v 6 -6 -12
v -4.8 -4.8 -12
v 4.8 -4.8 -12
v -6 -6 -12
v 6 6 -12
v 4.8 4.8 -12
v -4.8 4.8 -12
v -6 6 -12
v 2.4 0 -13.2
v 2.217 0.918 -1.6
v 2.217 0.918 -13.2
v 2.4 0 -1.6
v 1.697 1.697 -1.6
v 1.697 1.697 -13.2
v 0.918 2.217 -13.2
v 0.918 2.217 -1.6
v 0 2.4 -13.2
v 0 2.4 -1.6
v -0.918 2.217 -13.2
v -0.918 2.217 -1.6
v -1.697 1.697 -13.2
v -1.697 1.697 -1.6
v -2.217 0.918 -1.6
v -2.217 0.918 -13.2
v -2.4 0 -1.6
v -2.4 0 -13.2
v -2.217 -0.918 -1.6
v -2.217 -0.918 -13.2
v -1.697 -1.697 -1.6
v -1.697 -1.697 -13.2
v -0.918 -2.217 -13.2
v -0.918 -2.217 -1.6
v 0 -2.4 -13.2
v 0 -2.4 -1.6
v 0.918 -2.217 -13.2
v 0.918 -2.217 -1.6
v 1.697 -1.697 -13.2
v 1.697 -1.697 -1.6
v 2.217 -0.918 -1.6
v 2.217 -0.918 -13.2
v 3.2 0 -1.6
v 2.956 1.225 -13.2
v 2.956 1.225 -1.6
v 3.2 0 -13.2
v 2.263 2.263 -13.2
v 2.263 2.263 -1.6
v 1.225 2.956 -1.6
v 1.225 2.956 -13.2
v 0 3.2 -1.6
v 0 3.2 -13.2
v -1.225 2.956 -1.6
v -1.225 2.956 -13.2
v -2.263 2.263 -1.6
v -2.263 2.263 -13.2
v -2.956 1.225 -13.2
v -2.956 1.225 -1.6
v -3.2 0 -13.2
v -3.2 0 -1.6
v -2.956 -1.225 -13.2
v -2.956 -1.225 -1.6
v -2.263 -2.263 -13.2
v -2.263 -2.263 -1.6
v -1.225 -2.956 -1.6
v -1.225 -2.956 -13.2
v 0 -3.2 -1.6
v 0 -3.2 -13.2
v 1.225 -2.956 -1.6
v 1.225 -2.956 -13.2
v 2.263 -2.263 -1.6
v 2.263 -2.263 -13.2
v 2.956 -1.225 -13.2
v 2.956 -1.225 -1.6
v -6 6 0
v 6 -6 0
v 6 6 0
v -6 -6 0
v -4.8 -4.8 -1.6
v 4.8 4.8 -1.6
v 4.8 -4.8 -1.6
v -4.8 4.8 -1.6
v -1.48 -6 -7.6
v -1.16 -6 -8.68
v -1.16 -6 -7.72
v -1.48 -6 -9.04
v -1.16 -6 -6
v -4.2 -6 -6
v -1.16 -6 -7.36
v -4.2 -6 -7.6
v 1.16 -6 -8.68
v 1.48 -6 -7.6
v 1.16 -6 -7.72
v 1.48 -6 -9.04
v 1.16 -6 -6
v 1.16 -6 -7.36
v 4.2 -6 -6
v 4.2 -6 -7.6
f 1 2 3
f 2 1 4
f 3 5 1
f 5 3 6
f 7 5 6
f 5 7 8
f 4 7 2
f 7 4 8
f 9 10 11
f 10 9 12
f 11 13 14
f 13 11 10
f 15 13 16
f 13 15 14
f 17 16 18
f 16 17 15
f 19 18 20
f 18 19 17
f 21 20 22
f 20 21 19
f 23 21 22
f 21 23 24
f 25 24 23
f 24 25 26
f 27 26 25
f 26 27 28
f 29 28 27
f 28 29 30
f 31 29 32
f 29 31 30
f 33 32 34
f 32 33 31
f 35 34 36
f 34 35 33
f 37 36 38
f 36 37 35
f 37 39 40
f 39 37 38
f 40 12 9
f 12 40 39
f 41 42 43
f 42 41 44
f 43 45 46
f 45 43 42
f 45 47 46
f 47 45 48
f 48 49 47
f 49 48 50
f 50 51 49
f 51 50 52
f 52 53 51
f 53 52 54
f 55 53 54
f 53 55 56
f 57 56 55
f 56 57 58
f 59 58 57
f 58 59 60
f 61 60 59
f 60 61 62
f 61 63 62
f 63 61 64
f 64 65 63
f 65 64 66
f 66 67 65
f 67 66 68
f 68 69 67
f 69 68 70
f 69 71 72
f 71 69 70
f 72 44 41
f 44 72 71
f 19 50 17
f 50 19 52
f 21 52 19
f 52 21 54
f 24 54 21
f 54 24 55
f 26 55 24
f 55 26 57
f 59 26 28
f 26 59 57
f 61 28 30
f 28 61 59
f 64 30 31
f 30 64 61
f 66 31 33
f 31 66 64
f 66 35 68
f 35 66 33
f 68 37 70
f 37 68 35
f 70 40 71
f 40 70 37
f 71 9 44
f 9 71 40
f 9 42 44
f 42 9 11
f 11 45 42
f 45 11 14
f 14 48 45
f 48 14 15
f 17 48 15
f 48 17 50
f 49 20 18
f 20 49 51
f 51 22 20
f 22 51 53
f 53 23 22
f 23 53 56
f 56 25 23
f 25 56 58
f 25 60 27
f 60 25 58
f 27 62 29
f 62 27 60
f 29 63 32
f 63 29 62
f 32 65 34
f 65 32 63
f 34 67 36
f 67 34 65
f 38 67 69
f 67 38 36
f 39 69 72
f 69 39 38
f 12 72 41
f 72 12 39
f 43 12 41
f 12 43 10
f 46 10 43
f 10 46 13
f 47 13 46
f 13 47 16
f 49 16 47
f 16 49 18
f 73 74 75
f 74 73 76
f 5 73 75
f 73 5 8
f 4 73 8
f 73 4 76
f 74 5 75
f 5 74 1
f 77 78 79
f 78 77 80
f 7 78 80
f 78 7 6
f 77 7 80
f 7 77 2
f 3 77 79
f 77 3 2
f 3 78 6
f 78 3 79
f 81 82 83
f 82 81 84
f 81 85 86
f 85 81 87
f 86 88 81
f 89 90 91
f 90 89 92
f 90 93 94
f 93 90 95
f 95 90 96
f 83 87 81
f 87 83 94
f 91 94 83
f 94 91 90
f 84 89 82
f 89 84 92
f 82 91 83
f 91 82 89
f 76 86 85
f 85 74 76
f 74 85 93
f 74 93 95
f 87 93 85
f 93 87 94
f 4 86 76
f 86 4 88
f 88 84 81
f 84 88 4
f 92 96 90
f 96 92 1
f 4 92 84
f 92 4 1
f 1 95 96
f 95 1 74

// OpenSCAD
// file: ../p/4-4ring3.scad
use <../lib.scad>
$fa=1; $fs=0.2;
function ldraw_lib__4_4ring3(realsolid=false) = [
// 0 Ring  3 x 1.0
// 0 Name: 4-4ring3.dat
// 0 Author: James Jessiman
// 0 !LDRAW_ORG Primitive UPDATE 2009-01
// 0 !LICENSE Licensed under CC BY 2.0 and CC BY 4.0 : see CAreadme.txt
// 
// 0 BFC CERTIFY CCW
  [0,"BFC","CERTIFY"],
  [0,"BFC","CCW"],
// 
// 0 !HISTORY 1998-12-15 [PTadmin] Official Update 1998-10
// 0 !HISTORY 2002-04-05 [hafhead] Added BFC statement
// 0 !HISTORY 2002-04-25 [PTadmin] Official Update 2002-02
// 0 !HISTORY 2007-06-24 [PTadmin] Header formatted for Contributor Agreement
// 0 !HISTORY 2008-07-01 [PTadmin] Official Update 2008-01
// 0 !HISTORY 2008-08-26 [cwdee] Switch polygon winding and rename
// 0 !HISTORY 2009-05-02 [PTadmin] Official Update 2009-01
// 
// 
// 4 16 -1.5308 0 3.6956 -1.1481 0 2.7717 0 0 3 0 0 4
  [4,16,-1.5308,0,3.6956,-1.1481,0,2.7717,0,0,3,0,0,4],
// 4 16 -2.8284 0 2.8284 -2.1213 0 2.1213 -1.1481 0 2.7717 -1.5308 0 3.6956
  [4,16,-2.8284,0,2.8284,-2.1213,0,2.1213,-1.1481,0,2.7717,-1.5308,0,3.6956],
// 4 16 -3.6956 0 1.5308 -2.7717 0 1.1481 -2.1213 0 2.1213 -2.8284 0 2.8284
  [4,16,-3.6956,0,1.5308,-2.7717,0,1.1481,-2.1213,0,2.1213,-2.8284,0,2.8284],
// 4 16 -4 0 0 -3 0 0 -2.7717 0 1.1481 -3.6956 0 1.5308
  [4,16,-4,0,0,-3,0,0,-2.7717,0,1.1481,-3.6956,0,1.5308],
// 4 16 -3.6956 0 -1.5308 -2.7717 0 -1.1481 -3 0 0 -4 0 0
  [4,16,-3.6956,0,-1.5308,-2.7717,0,-1.1481,-3,0,0,-4,0,0],
// 4 16 -2.8284 0 -2.8284 -2.1213 0 -2.1213 -2.7717 0 -1.1481 -3.6956 0 -1.5308
  [4,16,-2.8284,0,-2.8284,-2.1213,0,-2.1213,-2.7717,0,-1.1481,-3.6956,0,-1.5308],
// 4 16 -1.5308 0 -3.6956 -1.1481 0 -2.7717 -2.1213 0 -2.1213 -2.8284 0 -2.8284
  [4,16,-1.5308,0,-3.6956,-1.1481,0,-2.7717,-2.1213,0,-2.1213,-2.8284,0,-2.8284],
// 4 16 0 0 -4 0 0 -3 -1.1481 0 -2.7717 -1.5308 0 -3.6956
  [4,16,0,0,-4,0,0,-3,-1.1481,0,-2.7717,-1.5308,0,-3.6956],
// 4 16 1.5308 0 -3.6956 1.1481 0 -2.7717 0 0 -3 0 0 -4
  [4,16,1.5308,0,-3.6956,1.1481,0,-2.7717,0,0,-3,0,0,-4],
// 4 16 2.8284 0 -2.8284 2.1213 0 -2.1213 1.1481 0 -2.7717 1.5308 0 -3.6956
  [4,16,2.8284,0,-2.8284,2.1213,0,-2.1213,1.1481,0,-2.7717,1.5308,0,-3.6956],
// 4 16 3.6956 0 -1.5308 2.7717 0 -1.1481 2.1213 0 -2.1213 2.8284 0 -2.8284
  [4,16,3.6956,0,-1.5308,2.7717,0,-1.1481,2.1213,0,-2.1213,2.8284,0,-2.8284],
// 4 16 4 0 0 3 0 0 2.7717 0 -1.1481 3.6956 0 -1.5308
  [4,16,4,0,0,3,0,0,2.7717,0,-1.1481,3.6956,0,-1.5308],
// 4 16 3.6956 0 1.5308 2.7717 0 1.1481 3 0 0 4 0 0
  [4,16,3.6956,0,1.5308,2.7717,0,1.1481,3,0,0,4,0,0],
// 4 16 2.8284 0 2.8284 2.1213 0 2.1213 2.7717 0 1.1481 3.6956 0 1.5308
  [4,16,2.8284,0,2.8284,2.1213,0,2.1213,2.7717,0,1.1481,3.6956,0,1.5308],
// 4 16 1.5308 0 3.6956 1.1481 0 2.7717 2.1213 0 2.1213 2.8284 0 2.8284
  [4,16,1.5308,0,3.6956,1.1481,0,2.7717,2.1213,0,2.1213,2.8284,0,2.8284],
// 4 16 0 0 4 0 0 3 1.1481 0 2.7717 1.5308 0 3.6956
  [4,16,0,0,4,0,0,3,1.1481,0,2.7717,1.5308,0,3.6956],
// 0
];
module ldraw_lib__4_4ring3(step=0, col=false, unit=2/5, alt=false, line=0.2, solid=!$preview)
    makepoly(ldraw_lib__4_4ring3(solid), step=step, col=col, unit=unit, alt=alt, line=line, solid=solid);
ldraw_lib__4_4ring3(line=0.2);
// file: ../p/4-4edge.scad
use <../lib.scad>
function ldraw_lib__4_4edge() = [
// 0 Circle 1.0
// 0 Name: 4-4edge.dat
// 0 Author: James Jessiman
// 0 !LDRAW_ORG Primitive UPDATE 2017-01
// 0 !LICENSE Licensed under CC BY 2.0 and CC BY 4.0 : see CAreadme.txt
// 
// 0 BFC CERTIFY CCW
  [0,"BFC","CERTIFY"],
  [0,"BFC","CCW"],
// 
// 0 !HISTORY 1998-12-15 [PTadmin] Official Update 1998-10
// 0 !HISTORY 2005-12-28 [PTadmin] Official Update 2005-01
// 0 !HISTORY 2007-06-24 [PTadmin] Header formatted for Contributor Agreement
// 0 !HISTORY 2008-07-01 [PTadmin] Official Update 2008-01
// 0 !HISTORY 2017-01-15 [Steffen] BFCed
// 0 !HISTORY 2017-12-30 [PTadmin] Official Update 2017-01
// 
// 
// 2 24 1 0 0 0.9239 0 0.3827
  [2,24,1,0,0,0.9239,0,0.3827],
// 2 24 0.9239 0 0.3827 0.7071 0 0.7071
  [2,24,0.9239,0,0.3827,0.7071,0,0.7071],
// 2 24 0.7071 0 0.7071 0.3827 0 0.9239
  [2,24,0.7071,0,0.7071,0.3827,0,0.9239],
// 2 24 0.3827 0 0.9239 0 0 1
  [2,24,0.3827,0,0.9239,0,0,1],
// 2 24 0 0 1 -0.3827 0 0.9239
  [2,24,0,0,1,-0.3827,0,0.9239],
// 2 24 -0.3827 0 0.9239 -0.7071 0 0.7071
  [2,24,-0.3827,0,0.9239,-0.7071,0,0.7071],
// 2 24 -0.7071 0 0.7071 -0.9239 0 0.3827
  [2,24,-0.7071,0,0.7071,-0.9239,0,0.3827],
// 2 24 -0.9239 0 0.3827 -1 0 -0
  [2,24,-0.9239,0,0.3827,-1,0,-0],
// 2 24 -1 0 -0 -0.9239 0 -0.3827
  [2,24,-1,0,-0,-0.9239,0,-0.3827],
// 2 24 -0.9239 0 -0.3827 -0.7071 0 -0.7071
  [2,24,-0.9239,0,-0.3827,-0.7071,0,-0.7071],
// 2 24 -0.7071 0 -0.7071 -0.3827 0 -0.9239
  [2,24,-0.7071,0,-0.7071,-0.3827,0,-0.9239],
// 2 24 -0.3827 0 -0.9239 0 0 -1
  [2,24,-0.3827,0,-0.9239,0,0,-1],
// 2 24 0 0 -1 0.3827 0 -0.9239
  [2,24,0,0,-1,0.3827,0,-0.9239],
// 2 24 0.3827 0 -0.9239 0.7071 0 -0.7071
  [2,24,0.3827,0,-0.9239,0.7071,0,-0.7071],
// 2 24 0.7071 0 -0.7071 0.9239 0 -0.3827
  [2,24,0.7071,0,-0.7071,0.9239,0,-0.3827],
// 2 24 0.9239 0 -0.3827 1 0 0
  [2,24,0.9239,0,-0.3827,1,0,0],
];
module ldraw_lib__4_4edge(step=0, col=false, unit=2/5, alt=false, line=0.2, solid=!$preview)
    makepoly(ldraw_lib__4_4edge(), step=step, col=col, unit=unit, alt=alt, line=line, solid=solid);
ldraw_lib__4_4edge(line=0.2);
// file: ../p/4-4cyli.scad
use <../lib.scad>
$fa=1; $fs=0.2;
function ldraw_lib__4_4cyli(realsolid=false) = [
// 0 Cylinder 1.0
// 0 Name: 4-4cyli.dat
// 0 Author: James Jessiman
// 0 !LDRAW_ORG Primitive UPDATE 2005-01
// 0 !LICENSE Licensed under CC BY 2.0 and CC BY 4.0 : see CAreadme.txt
// 
// 0 BFC CERTIFY CCW
  [0,"BFC","CERTIFY"],
  [0,"BFC","CCW"],
// 
// 0 !HISTORY 1998-12-15 [PTadmin] Official Update 1998-10
// 0 !HISTORY 2002-03-23 [sbliss] Added BFC statement; merged headers from files in distributions LDraw 0.27 and Complete.
// 0 !HISTORY 2002-04-25 [PTadmin] Official Update 2002-02
// 0 !HISTORY 2004-12-14 [guyvivan] BFC CCW
// 0 !HISTORY 2005-12-28 [PTadmin] Official Update 2005-01
// 0 !HISTORY 2007-06-24 [PTadmin] Header formatted for Contributor Agreement
// 0 !HISTORY 2008-07-01 [PTadmin] Official Update 2008-01
// 
// 
// 4 16 1 1 0 0.9239 1 0.3827 0.9239 0 0.3827 1 0 0
  [4,16,1,1,0,0.9239,1,0.3827,0.9239,0,0.3827,1,0,0],
// 5 24 1 0 0 1 1 0 0.9239 0 0.3827 0.9239 0 -0.3827
  [5,24,1,0,0,1,1,0,0.9239,0,0.3827,0.9239,0,-0.3827],
// 4 16 0.9239 1 0.3827 0.7071 1 0.7071 0.7071 0 0.7071 0.9239 0 0.3827
  [4,16,0.9239,1,0.3827,0.7071,1,0.7071,0.7071,0,0.7071,0.9239,0,0.3827],
// 5 24 0.9239 0 0.3827 0.9239 1 0.3827 0.7071 0 0.7071 1 0 0
  [5,24,0.9239,0,0.3827,0.9239,1,0.3827,0.7071,0,0.7071,1,0,0],
// 4 16 0.7071 1 0.7071 0.3827 1 0.9239 0.3827 0 0.9239 0.7071 0 0.7071
  [4,16,0.7071,1,0.7071,0.3827,1,0.9239,0.3827,0,0.9239,0.7071,0,0.7071],
// 5 24 0.7071 0 0.7071 0.7071 1 0.7071 0.3827 0 0.9239 0.9239 0 0.3827
  [5,24,0.7071,0,0.7071,0.7071,1,0.7071,0.3827,0,0.9239,0.9239,0,0.3827],
// 4 16 0.3827 1 0.9239 0 1 1 0 0 1 0.3827 0 0.9239
  [4,16,0.3827,1,0.9239,0,1,1,0,0,1,0.3827,0,0.9239],
// 5 24 0.3827 0 0.9239 0.3827 1 0.9239 0 0 1 0.7071 0 0.7071
  [5,24,0.3827,0,0.9239,0.3827,1,0.9239,0,0,1,0.7071,0,0.7071],
// 4 16 0 1 1 -0.3827 1 0.9239 -0.3827 0 0.9239 0 0 1
  [4,16,0,1,1,-0.3827,1,0.9239,-0.3827,0,0.9239,0,0,1],
// 5 24 0 0 1 0 1 1 -0.3827 0 0.9239 0.3827 0 0.9239
  [5,24,0,0,1,0,1,1,-0.3827,0,0.9239,0.3827,0,0.9239],
// 4 16 -0.3827 1 0.9239 -0.7071 1 0.7071 -0.7071 0 0.7071 -0.3827 0 0.9239
  [4,16,-0.3827,1,0.9239,-0.7071,1,0.7071,-0.7071,0,0.7071,-0.3827,0,0.9239],
// 5 24 -0.3827 0 0.9239 -0.3827 1 0.9239 -0.7071 0 0.7071 0 0 1
  [5,24,-0.3827,0,0.9239,-0.3827,1,0.9239,-0.7071,0,0.7071,0,0,1],
// 4 16 -0.7071 1 0.7071 -0.9239 1 0.3827 -0.9239 0 0.3827 -0.7071 0 0.7071
  [4,16,-0.7071,1,0.7071,-0.9239,1,0.3827,-0.9239,0,0.3827,-0.7071,0,0.7071],
// 5 24 -0.7071 0 0.7071 -0.7071 1 0.7071 -0.9239 0 0.3827 -0.3827 0 0.9239
  [5,24,-0.7071,0,0.7071,-0.7071,1,0.7071,-0.9239,0,0.3827,-0.3827,0,0.9239],
// 4 16 -0.9239 1 0.3827 -1 1 0 -1 0 0 -0.9239 0 0.3827
  [4,16,-0.9239,1,0.3827,-1,1,0,-1,0,0,-0.9239,0,0.3827],
// 5 24 -0.9239 0 0.3827 -0.9239 1 0.3827 -1 0 0 -0.7071 0 0.7071
  [5,24,-0.9239,0,0.3827,-0.9239,1,0.3827,-1,0,0,-0.7071,0,0.7071],
// 4 16 -1 1 0 -0.9239 1 -0.3827 -0.9239 0 -0.3827 -1 0 0
  [4,16,-1,1,0,-0.9239,1,-0.3827,-0.9239,0,-0.3827,-1,0,0],
// 5 24 -1 0 0 -1 1 0 -0.9239 0 -0.3827 -0.9239 0 0.3827
  [5,24,-1,0,0,-1,1,0,-0.9239,0,-0.3827,-0.9239,0,0.3827],
// 4 16 -0.9239 1 -0.3827 -0.7071 1 -0.7071 -0.7071 0 -0.7071 -0.9239 0 -0.3827
  [4,16,-0.9239,1,-0.3827,-0.7071,1,-0.7071,-0.7071,0,-0.7071,-0.9239,0,-0.3827],
// 5 24 -0.9239 0 -0.3827 -0.9239 1 -0.3827 -0.7071 0 -0.7071 -1 0 0
  [5,24,-0.9239,0,-0.3827,-0.9239,1,-0.3827,-0.7071,0,-0.7071,-1,0,0],
// 4 16 -0.7071 1 -0.7071 -0.3827 1 -0.9239 -0.3827 0 -0.9239 -0.7071 0 -0.7071
  [4,16,-0.7071,1,-0.7071,-0.3827,1,-0.9239,-0.3827,0,-0.9239,-0.7071,0,-0.7071],
// 5 24 -0.7071 0 -0.7071 -0.7071 1 -0.7071 -0.3827 0 -0.9239 -0.9239 0 -0.3827
  [5,24,-0.7071,0,-0.7071,-0.7071,1,-0.7071,-0.3827,0,-0.9239,-0.9239,0,-0.3827],
// 4 16 -0.3827 1 -0.9239 0 1 -1 0 0 -1 -0.3827 0 -0.9239
  [4,16,-0.3827,1,-0.9239,0,1,-1,0,0,-1,-0.3827,0,-0.9239],
// 5 24 -0.3827 0 -0.9239 -0.3827 1 -0.9239 0 0 -1 -0.7071 0 -0.7071
  [5,24,-0.3827,0,-0.9239,-0.3827,1,-0.9239,0,0,-1,-0.7071,0,-0.7071],
// 4 16 0 1 -1 0.3827 1 -0.9239 0.3827 0 -0.9239 0 0 -1
  [4,16,0,1,-1,0.3827,1,-0.9239,0.3827,0,-0.9239,0,0,-1],
// 5 24 0 0 -1 0 1 -1 0.3827 0 -0.9239 -0.3827 0 -0.9239
  [5,24,0,0,-1,0,1,-1,0.3827,0,-0.9239,-0.3827,0,-0.9239],
// 4 16 0.3827 1 -0.9239 0.7071 1 -0.7071 0.7071 0 -0.7071 0.3827 0 -0.9239
  [4,16,0.3827,1,-0.9239,0.7071,1,-0.7071,0.7071,0,-0.7071,0.3827,0,-0.9239],
// 5 24 0.3827 0 -0.9239 0.3827 1 -0.9239 0.7071 0 -0.7071 0 0 -1
  [5,24,0.3827,0,-0.9239,0.3827,1,-0.9239,0.7071,0,-0.7071,0,0,-1],
// 4 16 0.7071 1 -0.7071 0.9239 1 -0.3827 0.9239 0 -0.3827 0.7071 0 -0.7071
  [4,16,0.7071,1,-0.7071,0.9239,1,-0.3827,0.9239,0,-0.3827,0.7071,0,-0.7071],
// 5 24 0.7071 0 -0.7071 0.7071 1 -0.7071 0.9239 0 -0.3827 0.3827 0 -0.9239
  [5,24,0.7071,0,-0.7071,0.7071,1,-0.7071,0.9239,0,-0.3827,0.3827,0,-0.9239],
// 4 16 0.9239 1 -0.3827 1 1 0 1 0 0 0.9239 0 -0.3827
  [4,16,0.9239,1,-0.3827,1,1,0,1,0,0,0.9239,0,-0.3827],
// 5 24 0.9239 0 -0.3827 0.9239 1 -0.3827 1 0 0 0.7071 0 -0.7071
  [5,24,0.9239,0,-0.3827,0.9239,1,-0.3827,1,0,0,0.7071,0,-0.7071],
// 0
];
module ldraw_lib__4_4cyli(step=0, col=false, unit=2/5, alt=false, line=0.2, solid=!$preview)
    makepoly(ldraw_lib__4_4cyli(solid), step=step, col=col, unit=unit, alt=alt, line=line, solid=solid);
ldraw_lib__4_4cyli(line=0.2);
// file: ../p/stud4.scad
use <../lib.scad>
use <4-4cyli.scad>
use <4-4edge.scad>
use <4-4ring3.scad>
function ldraw_lib__stud4() = [
// 0 Stud Tube Open
// 0 Name: stud4.dat
// 0 Author: James Jessiman
// 0 !LDRAW_ORG Primitive UPDATE 2009-02
// 0 !LICENSE Licensed under CC BY 4.0 : see CAreadme.txt
// 
// 0 BFC CERTIFY CCW
  [0,"BFC","CERTIFY"],
  [0,"BFC","CCW"],
// 
// 0 !HISTORY 1999-07-05 [PTadmin] Official Update 1999-05
// 0 !HISTORY 2002-04-04 [sbliss] Modified for BFC compliance
// 0 !HISTORY 2002-04-25 [PTadmin] Official Update 2002-02
// 0 !HISTORY 2007-06-24 [PTadmin] Header formatted for Contributor Agreement
// 0 !HISTORY 2008-07-01 [PTadmin] Official Update 2008-01
// 0 !HISTORY 2009-06-21 [cwdee] Update ring references to 4-4ring
// 0 !HISTORY 2009-09-03 [PTadmin] Official Update 2009-02
// 
// 
// 1 16 0 -4 0 6 0 0 0 1 0 0 0 6 4-4edge.dat
  [1,16,0,-4,0,6,0,0,0,1,0,0,0,6, ldraw_lib__4_4edge()],
// 1 16 0 -4 0 8 0 0 0 1 0 0 0 8 4-4edge.dat
  [1,16,0,-4,0,8,0,0,0,1,0,0,0,8, ldraw_lib__4_4edge()],
// 1 16 0 0 0 6 0 0 0 1 0 0 0 6 4-4edge.dat
  [1,16,0,0,0,6,0,0,0,1,0,0,0,6, ldraw_lib__4_4edge()],
// 1 16 0 0 0 8 0 0 0 1 0 0 0 8 4-4edge.dat
  [1,16,0,0,0,8,0,0,0,1,0,0,0,8, ldraw_lib__4_4edge()],
// 0 BFC INVERTNEXT
  [0,"BFC","INVERTNEXT"],
// 1 16 0 -4 0 6 0 0 0 4 0 0 0 6 4-4cyli.dat
  [1,16,0,-4,0,6,0,0,0,4,0,0,0,6, ldraw_lib__4_4cyli()],
// 1 16 0 -4 0 8 0 0 0 4 0 0 0 8 4-4cyli.dat
  [1,16,0,-4,0,8,0,0,0,4,0,0,0,8, ldraw_lib__4_4cyli()],
// 1 16 0 -4 0 2 0 0 0 1 0 0 0 2 4-4ring3.dat
  [1,16,0,-4,0,2,0,0,0,1,0,0,0,2, ldraw_lib__4_4ring3()],
  [-1,16,0,0,0,2,0,0,0,-1,0,0,0,2, ldraw_lib__4_4ring3()],
// 0
];
module ldraw_lib__stud4(step=0, col=false, unit=2/5, alt=false, line=0.2, solid=!$preview)
    makepoly(ldraw_lib__stud4(), step=step, col=col, unit=unit, alt=alt, line=line, solid=solid);
ldraw_lib__stud4(line=0.2);
// file: ../p/box5.scad
use <../lib.scad>
function ldraw_lib__box5() = [
// 0 Box with 5 Faces and All Edges
// 0 Name: box5.dat
// 0 Author: James Jessiman
// 0 !LDRAW_ORG Primitive UPDATE 2012-01
// 0 !LICENSE Licensed under CC BY 2.0 and CC BY 4.0 : see CAreadme.txt
// 
// 0 BFC CERTIFY CCW
  [0,"BFC","CERTIFY"],
  [0,"BFC","CCW"],
// 
// 0 !HISTORY 2002-04-03 [sbliss] Modified for BFC compliance
// 0 !HISTORY 2002-04-25 [PTadmin] Official Update 2002-02
// 0 !HISTORY 2007-06-24 [PTadmin] Header formatted for Contributor Agreement
// 0 !HISTORY 2008-07-01 [PTadmin] Official Update 2008-01
// 0 !HISTORY 2012-02-16 [Philo] Changed to CCW
// 0 !HISTORY 2012-03-30 [PTadmin] Official Update 2012-01
// 
// 
// 2 24 1 1 1 -1 1 1
  [2,24,1,1,1,-1,1,1],
// 2 24 -1 1 1 -1 1 -1
  [2,24,-1,1,1,-1,1,-1],
// 2 24 -1 1 -1 1 1 -1
  [2,24,-1,1,-1,1,1,-1],
// 2 24 1 1 -1 1 1 1
  [2,24,1,1,-1,1,1,1],
// 2 24 1 0 1 -1 0 1
  [2,24,1,0,1,-1,0,1],
// 2 24 -1 0 1 -1 0 -1
  [2,24,-1,0,1,-1,0,-1],
// 2 24 -1 0 -1 1 0 -1
  [2,24,-1,0,-1,1,0,-1],
// 2 24 1 0 -1 1 0 1
  [2,24,1,0,-1,1,0,1],
// 2 24 1 0 1 1 1 1
  [2,24,1,0,1,1,1,1],
// 2 24 -1 0 1 -1 1 1
  [2,24,-1,0,1,-1,1,1],
// 2 24 1 0 -1 1 1 -1
  [2,24,1,0,-1,1,1,-1],
// 2 24 -1 0 -1 -1 1 -1
  [2,24,-1,0,-1,-1,1,-1],
// 4 16 -1 1 1 1 1 1 1 1 -1 -1 1 -1
  [4,16,-1,1,1,1,1,1,1,1,-1,-1,1,-1],
// 4 16 -1 1 1 -1 0 1 1 0 1 1 1 1
  [4,16,-1,1,1,-1,0,1,1,0,1,1,1,1],
// 4 16 -1 1 -1 -1 0 -1 -1 0 1 -1 1 1
  [4,16,-1,1,-1,-1,0,-1,-1,0,1,-1,1,1],
// 4 16 1 1 -1 1 0 -1 -1 0 -1 -1 1 -1
  [4,16,1,1,-1,1,0,-1,-1,0,-1,-1,1,-1],
// 4 16 1 1 1 1 0 1 1 0 -1 1 1 -1
  [4,16,1,1,1,1,0,1,1,0,-1,1,1,-1],
];
makepoly(ldraw_lib__box5(), line=0.2);
// file: ../p/box4t.scad
use <../lib.scad>
function ldraw_lib__box4t() = [
// 0 Box with 4 Adjacent Faces and All Edges
// 0 Name: box4t.dat
// 0 Author: Tore Eriksson [Tore_Eriksson]
// 0 !LDRAW_ORG Primitive UPDATE 2003-02
// 0 !LICENSE Licensed under CC BY 2.0 and CC BY 4.0 : see CAreadme.txt
// 
// 0 BFC CERTIFY CCW
  [0,"BFC","CERTIFY"],
  [0,"BFC","CCW"],
// 
// 0 !HISTORY 1997-09-29 [PTadmin] Official Update 1997-15
// 0 !HISTORY 2002-08-31 [izanette] Modified with WINDZ for BFC compliance
// 0 !HISTORY 2003-08-01 [PTadmin] Official Update 2003-02
// 0 !HISTORY 2007-06-24 [PTadmin] Header formatted for Contributor Agreement
// 0 !HISTORY 2008-07-01 [PTadmin] Official Update 2008-01
// 
// 
// 2 24 1 1 1 -1 1 1
  [2,24,1,1,1,-1,1,1],
// 2 24 -1 1 1 -1 1 -1
  [2,24,-1,1,1,-1,1,-1],
// 2 24 -1 1 -1 1 1 -1
  [2,24,-1,1,-1,1,1,-1],
// 2 24 1 1 -1 1 1 1
  [2,24,1,1,-1,1,1,1],
// 2 24 1 0 1 -1 0 1
  [2,24,1,0,1,-1,0,1],
// 2 24 -1 0 1 -1 0 -1
  [2,24,-1,0,1,-1,0,-1],
// 2 24 -1 0 -1 1 0 -1
  [2,24,-1,0,-1,1,0,-1],
// 2 24 1 0 -1 1 0 1
  [2,24,1,0,-1,1,0,1],
// 2 24 1 0 1 1 1 1
  [2,24,1,0,1,1,1,1],
// 2 24 -1 0 1 -1 1 1
  [2,24,-1,0,1,-1,1,1],
// 2 24 1 0 -1 1 1 -1
  [2,24,1,0,-1,1,1,-1],
// 2 24 -1 0 -1 -1 1 -1
  [2,24,-1,0,-1,-1,1,-1],
// 4 16 1 1 1 1 1 -1 -1 1 -1 -1 1 1
  [4,16,1,1,1,1,1,-1,-1,1,-1,-1,1,1],
// 4 16 1 1 1 -1 1 1 -1 0 1 1 0 1
  [4,16,1,1,1,-1,1,1,-1,0,1,1,0,1],
// 4 16 -1 1 1 -1 1 -1 -1 0 -1 -1 0 1
  [4,16,-1,1,1,-1,1,-1,-1,0,-1,-1,0,1],
// 0 4 16 -1 1 -1 -1 0 -1 1 0 -1 1 1 -1
// 4 16 1 1 -1 1 1 1 1 0 1 1 0 -1
  [4,16,1,1,-1,1,1,1,1,0,1,1,0,-1],
// 0
];
makepoly(ldraw_lib__box4t(), line=0.2);
// file: s/19729s01.scad
use <../../lib.scad>
use <../../p/box4t.scad>
use <../../p/box5.scad>
use <../../p/stud4.scad>
function ldraw_lib__s__19729s01() = [
// 0 ~Minifig Head Cuboid without Front Surface
// 0 Name: s\19729s01.dat
// 0 Author: Mark Kennedy [mkennedy]
// 0 !LDRAW_ORG Subpart UPDATE 2016-01
// 0 !LICENSE Licensed under CC BY 4.0 : see CAreadme.txt
// 
// 0 BFC CERTIFY CW
  [0,"BFC","CERTIFY"],
  [0,"BFC","CW"],
// 
// 0 !HISTORY 2016-03-18 {LEGO Digital Designer} Original part shape
// 0 !HISTORY 2016-03-28 [mkennedy] Primitive substitution
// 0 !HISTORY 2016-12-31 [PTadmin] Official Update 2016-01
// 
// 
// 4 16 15 30 -15 12 30 -12 -12 30 -12 -15 30 -15
  [4,16,15,30,-15,12,30,-12,-12,30,-12,-15,30,-15],
// 4 16 15 30 15 12 30 12 12 30 -12 15 30 -15
  [4,16,15,30,15,12,30,12,12,30,-12,15,30,-15],
// 4 16 -15 30 15 -12 30 12 12 30 12 15 30 15
  [4,16,-15,30,15,-12,30,12,12,30,12,15,30,15],
// 4 16 -15 30 -15 -12 30 -12 -12 30 12 -15 30 15
  [4,16,-15,30,-15,-12,30,-12,-12,30,12,-15,30,15],
// 0
// 1 16 0 4 0 1 0 0 0 -7.25 0 0 0 1 stud4.dat
  [1,16,0,4,0,1,0,0,0,-7.25,0,0,0,1, ldraw_lib__stud4()],
// 1 16 0 30 0 15 0 0 0 -30 0 0 0 15 box4t.dat
  [1,16,0,30,0,15,0,0,0,-30,0,0,0,15, ldraw_lib__box4t()],
// 0 BFC INVERTNEXT
  [0,"BFC","INVERTNEXT"],
// 1 16 0 30 0 12 0 0 0 -26 0 0 0 12 box5.dat
  [1,16,0,30,0,12,0,0,0,-26,0,0,0,12, ldraw_lib__box5()],
// 
];
module ldraw_lib__s__19729s01(step=0, col=false, unit=2/5, alt=false, line=0.2, solid=!$preview)
    makepoly(ldraw_lib__s__19729s01(), step=step, col=col, unit=unit, alt=alt, line=line, solid=solid);
ldraw_lib__s__19729s01(line=0.2);
// main file
use <../lib.scad>
use <s/19729s01.scad>
function ldraw_lib__19729p00() = [
// 0 Minifig Head Cuboid with Minecraft Zombie Pattern
// 0 Name: 19729p00.dat
// 0 Author: Evert-Jan Boer [ejboer]
// 0 !LDRAW_ORG Part UPDATE 2024-04
// 0 !LICENSE Licensed under CC BY 4.0 : see CAreadme.txt
// 
// 0 BFC CERTIFY CCW
  [0,"BFC","CERTIFY"],
  [0,"BFC","CCW"],
// 
// 0 !KEYWORDS Bricklink 19729pb005, Brickowl 255155, Rebrickable 19729pr0003
// 0 !KEYWORDS Set 21113, Set 21119, Set 21123, set 21147, set 21161
// 
// 0 !HISTORY 2024-05-28 [OrionP] Official Update 2024-04
// 
// 
// 1 16 0 0 0 1 0 0 0 1 0 0 0 1 s\19729s01.dat
  [1,16,0,0,0,1,0,0,0,1,0,0,0,1, ldraw_lib__s__19729s01()],
// 4 0 -2.9 21.7 -15 -2.9 19.3 -15 -3.7 19 -15 -3.7 22.6 -15
  [4,0,-2.9,21.7,-15,-2.9,19.3,-15,-3.7,19,-15,-3.7,22.6,-15],
// 4 0 -2.9 18.4 -15 -2.9 15 -15 -10.5 15 -15 -3.7 19 -15
  [4,0,-2.9,18.4,-15,-2.9,15,-15,-10.5,15,-15,-3.7,19,-15],
// 3 0 -10.5 15 -15 -10.5 19 -15 -3.7 19 -15
  [3,0,-10.5,15,-15,-10.5,19,-15,-3.7,19,-15],
// 4 0 2.9 21.7 -15 3.7 22.6 -15 3.7 19 -15 2.9 19.3 -15
  [4,0,2.9,21.7,-15,3.7,22.6,-15,3.7,19,-15,2.9,19.3,-15],
// 4 0 2.9 18.4 -15 3.7 19 -15 10.5 15 -15 2.9 15 -15
  [4,0,2.9,18.4,-15,3.7,19,-15,10.5,15,-15,2.9,15,-15],
// 3 0 10.5 15 -15 3.7 19 -15 10.5 19 -15
  [3,0,10.5,15,-15,3.7,19,-15,10.5,19,-15],
// 4 0 -3.7 19 -15 -2.9 19.3 -15 2.9 18.4 -15 -2.9 18.4 -15
  [4,0,-3.7,19,-15,-2.9,19.3,-15,2.9,18.4,-15,-2.9,18.4,-15],
// 4 0 -2.9 19.3 -15 2.9 19.3 -15 3.7 19 -15 2.9 18.4 -15
  [4,0,-2.9,19.3,-15,2.9,19.3,-15,3.7,19,-15,2.9,18.4,-15],
// 4 0 -3.7 22.6 -15 3.7 22.6 -15 2.9 21.7 -15 -2.9 21.7 -15
  [4,0,-3.7,22.6,-15,3.7,22.6,-15,2.9,21.7,-15,-2.9,21.7,-15],
// 4 288 -2.9 19.3 -15 -2.9 21.7 -15 2.9 21.7 -15 2.9 19.3 -15
  [4,288,-2.9,19.3,-15,-2.9,21.7,-15,2.9,21.7,-15,2.9,19.3,-15],
// 3 16 -15 0 -15 -10.5 15 -15 -2.9 15 -15
  [3,16,-15,0,-15,-10.5,15,-15,-2.9,15,-15],
// 4 16 -2.9 15 -15 2.9 15 -15 15 0 -15 -15 0 -15
  [4,16,-2.9,15,-15,2.9,15,-15,15,0,-15,-15,0,-15],
// 3 16 15 0 -15 2.9 15 -15 10.5 15 -15
  [3,16,15,0,-15,2.9,15,-15,10.5,15,-15],
// 4 16 -2.9 15 -15 -2.9 18.4 -15 2.9 18.4 -15 2.9 15 -15
  [4,16,-2.9,15,-15,-2.9,18.4,-15,2.9,18.4,-15,2.9,15,-15],
// 4 16 -10.5 15 -15 -15 0 -15 -15 30 -15 -10.5 19 -15
  [4,16,-10.5,15,-15,-15,0,-15,-15,30,-15,-10.5,19,-15],
// 4 16 -10.5 19 -15 -15 30 -15 -3.7 22.6 -15 -3.7 19 -15
  [4,16,-10.5,19,-15,-15,30,-15,-3.7,22.6,-15,-3.7,19,-15],
// 4 16 3.7 19 -15 3.7 22.6 -15 15 30 -15 10.5 19 -15
  [4,16,3.7,19,-15,3.7,22.6,-15,15,30,-15,10.5,19,-15],
// 4 16 -3.7 22.6 -15 -15 30 -15 15 30 -15 3.7 22.6 -15
  [4,16,-3.7,22.6,-15,-15,30,-15,15,30,-15,3.7,22.6,-15],
// 4 16 10.5 19 -15 15 30 -15 15 0 -15 10.5 15 -15
  [4,16,10.5,19,-15,15,30,-15,15,0,-15,10.5,15,-15],
];
module ldraw_lib__19729p00(step=0, col=false, unit=2/5, alt=false, line=0.2, solid=!$preview)
    makepoly(ldraw_lib__19729p00(), step=step, col=col, unit=unit, alt=alt, line=line, solid=solid);
ldraw_lib__19729p00(line=0.2);
